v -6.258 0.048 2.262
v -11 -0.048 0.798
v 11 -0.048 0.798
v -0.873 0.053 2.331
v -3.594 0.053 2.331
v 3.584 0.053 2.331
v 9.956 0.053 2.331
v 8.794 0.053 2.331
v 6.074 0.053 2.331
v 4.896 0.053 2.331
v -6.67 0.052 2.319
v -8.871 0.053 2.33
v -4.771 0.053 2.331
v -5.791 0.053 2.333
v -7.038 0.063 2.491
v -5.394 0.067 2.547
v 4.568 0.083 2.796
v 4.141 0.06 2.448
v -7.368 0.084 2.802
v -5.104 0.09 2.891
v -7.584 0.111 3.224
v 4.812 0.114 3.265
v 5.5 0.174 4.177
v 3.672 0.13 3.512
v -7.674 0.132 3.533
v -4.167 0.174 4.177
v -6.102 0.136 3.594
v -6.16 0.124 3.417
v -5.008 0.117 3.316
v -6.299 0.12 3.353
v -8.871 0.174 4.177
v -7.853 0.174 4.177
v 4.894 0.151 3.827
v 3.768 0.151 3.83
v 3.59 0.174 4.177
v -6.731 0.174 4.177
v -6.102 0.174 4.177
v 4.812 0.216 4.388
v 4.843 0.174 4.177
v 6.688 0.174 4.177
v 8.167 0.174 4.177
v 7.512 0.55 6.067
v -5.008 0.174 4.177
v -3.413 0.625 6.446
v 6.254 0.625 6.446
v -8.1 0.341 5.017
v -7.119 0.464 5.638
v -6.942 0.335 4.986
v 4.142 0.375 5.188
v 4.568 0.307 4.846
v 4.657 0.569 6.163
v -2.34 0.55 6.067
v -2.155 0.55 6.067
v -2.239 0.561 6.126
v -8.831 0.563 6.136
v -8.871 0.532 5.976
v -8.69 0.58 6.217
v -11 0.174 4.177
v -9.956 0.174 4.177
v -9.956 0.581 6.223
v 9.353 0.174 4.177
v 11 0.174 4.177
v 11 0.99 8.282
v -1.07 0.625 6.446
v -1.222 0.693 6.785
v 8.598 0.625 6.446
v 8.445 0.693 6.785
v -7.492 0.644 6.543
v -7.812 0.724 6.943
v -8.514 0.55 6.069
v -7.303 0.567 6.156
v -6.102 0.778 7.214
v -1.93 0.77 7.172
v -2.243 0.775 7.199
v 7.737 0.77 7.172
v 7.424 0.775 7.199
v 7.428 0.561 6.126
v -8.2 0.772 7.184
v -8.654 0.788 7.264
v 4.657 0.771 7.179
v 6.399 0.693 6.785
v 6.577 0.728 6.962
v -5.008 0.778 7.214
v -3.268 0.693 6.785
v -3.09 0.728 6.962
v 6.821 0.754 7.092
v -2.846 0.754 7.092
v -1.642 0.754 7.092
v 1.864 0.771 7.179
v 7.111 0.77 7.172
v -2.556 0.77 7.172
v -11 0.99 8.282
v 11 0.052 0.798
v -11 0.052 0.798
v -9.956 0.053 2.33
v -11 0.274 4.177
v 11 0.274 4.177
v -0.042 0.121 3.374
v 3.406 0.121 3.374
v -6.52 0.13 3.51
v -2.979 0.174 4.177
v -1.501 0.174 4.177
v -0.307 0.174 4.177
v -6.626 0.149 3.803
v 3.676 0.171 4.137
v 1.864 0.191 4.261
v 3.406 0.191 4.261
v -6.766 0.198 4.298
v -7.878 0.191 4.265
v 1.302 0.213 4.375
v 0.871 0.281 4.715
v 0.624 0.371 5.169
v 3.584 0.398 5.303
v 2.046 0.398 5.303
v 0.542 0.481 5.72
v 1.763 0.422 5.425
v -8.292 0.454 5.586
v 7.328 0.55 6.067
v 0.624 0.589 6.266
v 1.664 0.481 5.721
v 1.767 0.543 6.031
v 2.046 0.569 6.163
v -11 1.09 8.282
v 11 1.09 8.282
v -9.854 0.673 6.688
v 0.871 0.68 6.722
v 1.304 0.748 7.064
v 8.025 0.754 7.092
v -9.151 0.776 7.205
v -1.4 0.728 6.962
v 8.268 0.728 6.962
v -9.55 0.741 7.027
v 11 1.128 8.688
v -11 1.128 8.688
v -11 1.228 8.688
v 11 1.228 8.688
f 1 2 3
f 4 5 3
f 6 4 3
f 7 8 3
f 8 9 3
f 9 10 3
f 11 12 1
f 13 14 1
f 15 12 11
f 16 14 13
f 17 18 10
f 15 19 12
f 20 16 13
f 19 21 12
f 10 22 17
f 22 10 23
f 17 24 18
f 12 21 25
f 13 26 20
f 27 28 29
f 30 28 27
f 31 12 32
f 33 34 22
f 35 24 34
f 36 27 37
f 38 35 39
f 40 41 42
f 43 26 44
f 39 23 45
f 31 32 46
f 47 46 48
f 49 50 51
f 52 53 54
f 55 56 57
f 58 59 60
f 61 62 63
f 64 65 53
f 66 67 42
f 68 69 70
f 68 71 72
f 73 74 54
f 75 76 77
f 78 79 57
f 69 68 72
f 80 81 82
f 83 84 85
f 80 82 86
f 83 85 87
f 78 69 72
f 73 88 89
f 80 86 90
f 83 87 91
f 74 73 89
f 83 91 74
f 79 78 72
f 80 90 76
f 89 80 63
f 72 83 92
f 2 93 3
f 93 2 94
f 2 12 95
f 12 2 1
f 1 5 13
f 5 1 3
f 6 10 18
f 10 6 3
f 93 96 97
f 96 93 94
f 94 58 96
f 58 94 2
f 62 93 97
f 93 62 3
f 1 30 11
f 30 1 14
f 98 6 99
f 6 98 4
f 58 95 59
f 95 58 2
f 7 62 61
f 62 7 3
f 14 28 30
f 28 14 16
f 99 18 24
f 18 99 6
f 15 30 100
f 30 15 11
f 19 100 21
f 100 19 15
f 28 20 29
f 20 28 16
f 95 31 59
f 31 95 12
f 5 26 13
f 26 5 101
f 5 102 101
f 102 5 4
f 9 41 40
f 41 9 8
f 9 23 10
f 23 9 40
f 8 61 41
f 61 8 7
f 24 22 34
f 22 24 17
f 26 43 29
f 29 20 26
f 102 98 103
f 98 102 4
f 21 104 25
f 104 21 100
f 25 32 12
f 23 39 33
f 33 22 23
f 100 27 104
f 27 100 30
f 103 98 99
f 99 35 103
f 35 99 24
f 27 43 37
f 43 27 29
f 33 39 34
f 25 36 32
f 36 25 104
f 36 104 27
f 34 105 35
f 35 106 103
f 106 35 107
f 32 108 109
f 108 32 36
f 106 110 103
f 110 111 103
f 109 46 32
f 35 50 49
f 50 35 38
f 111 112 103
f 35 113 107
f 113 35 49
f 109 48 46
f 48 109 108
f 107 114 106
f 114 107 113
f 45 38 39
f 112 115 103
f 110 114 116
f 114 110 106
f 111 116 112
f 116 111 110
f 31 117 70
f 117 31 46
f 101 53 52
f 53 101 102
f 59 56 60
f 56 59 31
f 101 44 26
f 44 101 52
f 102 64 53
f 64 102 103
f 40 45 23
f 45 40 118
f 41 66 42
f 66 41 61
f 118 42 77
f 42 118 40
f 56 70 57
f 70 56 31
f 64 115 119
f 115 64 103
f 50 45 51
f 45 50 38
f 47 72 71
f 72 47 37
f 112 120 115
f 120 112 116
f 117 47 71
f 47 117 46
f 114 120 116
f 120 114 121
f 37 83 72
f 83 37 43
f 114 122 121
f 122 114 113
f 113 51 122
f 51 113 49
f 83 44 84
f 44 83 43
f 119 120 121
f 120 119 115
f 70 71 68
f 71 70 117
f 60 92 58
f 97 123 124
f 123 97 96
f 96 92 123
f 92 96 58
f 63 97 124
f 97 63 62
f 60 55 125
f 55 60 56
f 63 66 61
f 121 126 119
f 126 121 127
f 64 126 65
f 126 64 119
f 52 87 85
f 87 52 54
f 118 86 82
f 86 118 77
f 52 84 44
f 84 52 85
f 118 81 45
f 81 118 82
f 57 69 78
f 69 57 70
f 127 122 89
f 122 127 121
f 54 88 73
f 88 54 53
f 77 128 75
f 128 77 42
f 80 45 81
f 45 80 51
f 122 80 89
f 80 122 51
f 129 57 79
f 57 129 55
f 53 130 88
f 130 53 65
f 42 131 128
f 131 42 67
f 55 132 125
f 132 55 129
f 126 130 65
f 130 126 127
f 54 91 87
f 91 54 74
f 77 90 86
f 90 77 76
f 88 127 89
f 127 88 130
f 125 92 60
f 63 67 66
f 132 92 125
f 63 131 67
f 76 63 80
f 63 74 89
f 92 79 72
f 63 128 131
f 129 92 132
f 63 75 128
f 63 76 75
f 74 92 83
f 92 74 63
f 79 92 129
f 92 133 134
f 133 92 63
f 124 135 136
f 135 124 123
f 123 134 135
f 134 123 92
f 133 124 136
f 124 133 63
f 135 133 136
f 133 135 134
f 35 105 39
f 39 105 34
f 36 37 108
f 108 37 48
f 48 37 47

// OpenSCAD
use <../lib.scad>
function ldraw_lib__6342851ec01() = [
// 0 Sticker  1 x  2.8 with Dark Bluish Grey NASA Worm Logo (Formed)
// 0 Name: 6342851ec01.dat
// 0 Author: Orion Pobursky [OrionP]
// 0 !LDRAW_ORG Part UPDATE 2023-01
// 0 !LICENSE Licensed under CC BY 4.0 : see CAreadme.txt
// 
// 0 BFC CERTIFY CCW
  [0,"BFC","CERTIFY"],
  [0,"BFC","CCW"],
// 
// 0 !KEYWORDS Discovery, Set 10283, Space Shuttle
// 
// 0 !HISTORY 2023-03-05 [OrionP] Official Update 2023-01
// 
// 
// 3 15 -15.645 -5.654867 0.12064 -27.5 -1.995718 -0.119194 27.5 -1.995718 -0.119194
  [3,15,-15.645,-5.654867,0.12064,-27.5,-1.995718,-0.119194,27.5,-1.995718,-0.119194],
// 3 15 -2.182 -5.827496 0.131954 -8.984 -5.827496 0.131954 27.5 -1.995718 -0.119194
  [3,15,-2.182,-5.827496,0.131954,-8.984,-5.827496,0.131954,27.5,-1.995718,-0.119194],
// 3 15 8.959 -5.828494 0.13202 -2.182 -5.827496 0.131954 27.5 -1.995718 -0.119194
  [3,15,8.959,-5.828494,0.13202,-2.182,-5.827496,0.131954,27.5,-1.995718,-0.119194],
// 3 15 24.89 -5.828494 0.13202 21.986 -5.828494 0.13202 27.5 -1.995718 -0.119194
  [3,15,24.89,-5.828494,0.13202,21.986,-5.828494,0.13202,27.5,-1.995718,-0.119194],
// 3 15 21.986 -5.828494 0.13202 15.185 -5.828494 0.13202 27.5 -1.995718 -0.119194
  [3,15,21.986,-5.828494,0.13202,15.185,-5.828494,0.13202,27.5,-1.995718,-0.119194],
// 3 15 15.185 -5.828494 0.13202 12.241 -5.828494 0.13202 27.5 -1.995718 -0.119194
  [3,15,15.185,-5.828494,0.13202,12.241,-5.828494,0.13202,27.5,-1.995718,-0.119194],
// 3 15 -16.675 -5.79756 0.129992 -22.177 -5.824503 0.131758 -15.645 -5.654867 0.12064
  [3,15,-16.675,-5.79756,0.129992,-22.177,-5.824503,0.131758,-15.645,-5.654867,0.12064],
// 3 15 -11.927 -5.827496 0.131954 -14.477 -5.832485 0.132281 -15.645 -5.654867 0.12064
  [3,15,-11.927,-5.827496,0.131954,-14.477,-5.832485,0.132281,-15.645,-5.654867,0.12064],
// 3 15 -17.595 -6.22664 0.158116 -22.177 -5.824503 0.131758 -16.675 -5.79756 0.129992
  [3,15,-17.595,-6.22664,0.158116,-22.177,-5.824503,0.131758,-16.675,-5.79756,0.129992],
// 3 15 -13.485 -6.36634 0.167272 -14.477 -5.832485 0.132281 -11.927 -5.827496 0.131954
  [3,15,-13.485,-6.36634,0.167272,-14.477,-5.832485,0.132281,-11.927,-5.827496,0.131954],
// 3 15 11.42 -6.991 0.208214 10.353 -6.118871 0.151052 12.241 -5.828494 0.13202
  [3,15,11.42,-6.991,0.208214,10.353,-6.118871,0.151052,12.241,-5.828494,0.13202],
// 3 15 -17.595 -6.22664 0.158116 -18.419 -7.005968 0.209195 -22.177 -5.824503 0.131758
  [3,15,-17.595,-6.22664,0.158116,-18.419,-7.005968,0.209195,-22.177,-5.824503,0.131758],
// 3 15 -12.761 -7.22849 0.22378 -13.485 -6.36634 0.167272 -11.927 -5.827496 0.131954
  [3,15,-12.761,-7.22849,0.22378,-13.485,-6.36634,0.167272,-11.927,-5.827496,0.131954],
// 3 15 -18.419 -7.005968 0.209195 -18.961 -8.060704 0.278326 -22.177 -5.824503 0.131758
  [3,15,-18.419,-7.005968,0.209195,-18.961,-8.060704,0.278326,-22.177,-5.824503,0.131758],
// 4 15 12.031 -8.161488 0.284932 11.42 -6.991 0.208214 12.241 -5.828494 0.13202 13.749291 -10.442095 0.434411
  [4,15,12.031,-8.161488,0.284932,11.42,-6.991,0.208214,12.241,-5.828494,0.13202,13.749291,-10.442095,0.434411],
// 3 72 11.42 -6.991 0.208214 9.179 -8.779163 0.325417 10.353 -6.118871 0.151052
  [3,72,11.42,-6.991,0.208214,9.179,-8.779163,0.325417,10.353,-6.118871,0.151052],
// 3 15 -22.177 -5.824503 0.131758 -18.961 -8.060704 0.278326 -19.185 -8.833047 0.328948
  [3,15,-22.177,-5.824503,0.131758,-18.961,-8.060704,0.278326,-19.185,-8.833047,0.328948],
// 3 15 -11.927 -5.827496 0.131954 -10.418528 -10.442095 0.434411 -12.761 -7.22849 0.22378
  [3,15,-11.927,-5.827496,0.131954,-10.418528,-10.442095,0.434411,-12.761,-7.22849,0.22378],
// 3 72 -15.254 -8.984722 0.33889 -15.4 -8.543668 0.309982 -12.52 -8.29121 0.293435
  [3,72,-15.254,-8.984722,0.33889,-15.4,-8.543668,0.309982,-12.52,-8.29121,0.293435],
// 3 15 -15.747 -8.383013 0.299452 -15.4 -8.543668 0.309982 -15.254 -8.984722 0.33889
  [3,15,-15.747,-8.383013,0.299452,-15.4,-8.543668,0.309982,-15.254,-8.984722,0.33889],
// 3 15 -22.177 -10.442095 .434411 -22.177 -5.824503 .131758 -19.632429 -10.442095 .434411
  [3,15,-22.177,-10.442095,.434411,-22.177,-5.824503,.131758,-19.632429,-10.442095,.434411],
// 3 72 12.234 -9.567471 0.377085 9.42 -9.575454 0.377608 12.031 -8.161488 0.284932
  [3,72,12.234,-9.567471,0.377085,9.42,-9.575454,0.377608,12.031,-8.161488,0.284932],
// 3 15 8.974959 -10.442095 .434411 9.179 -8.779163 .325417 9.42 -9.575454 .377608
  [3,15,8.974959,-10.442095,.434411,9.179,-8.779163,.325417,9.42,-9.575454,.377608],
// 3 15 -16.828495 -10.442095 .434411 -15.254 -8.984722 .33889 -15.254 -10.442095 .434411
  [3,15,-16.828495,-10.442095,.434411,-15.254,-8.984722,.33889,-15.254,-10.442095,.434411],
// 3 72 12.031 -10.969267 .539272 8.974959 -10.442095 .434411 12.108166 -10.442095 .434411
  [3,72,12.031,-10.969267,.539272,8.974959,-10.442095,.434411,12.108166,-10.442095,.434411],
// 3 15 16.7198 -10.442095 .434411 20.416429 -10.442095 .434411 18.781 -15.167028 1.374259
  [3,15,16.7198,-10.442095,.434411,20.416429,-10.442095,.434411,18.781,-15.167028,1.374259],
// 3 15 -12.52 -10.442095 .434411 -10.418528 -10.442095 .434411 -8.532 -16.114466 1.562716
  [3,15,-12.52,-10.442095,.434411,-10.418528,-10.442095,.434411,-8.532,-16.114466,1.562716],
// 3 15 12.108166 -10.442095 .434411 13.749291 -10.442095 .434411 15.636 -16.114466 1.562716
  [3,15,12.108166,-10.442095,.434411,13.749291,-10.442095,.434411,15.636,-16.114466,1.562716],
// 3 15 -22.177 -10.442095 .434411 -19.632429 -10.442095 .434411 -20.25 -12.543427 .852392
  [3,15,-22.177,-10.442095,.434411,-19.632429,-10.442095,.434411,-20.25,-12.543427,.852392],
// 3 72 -17.798 -14.094049 1.16083 -20.25 -12.543427 0.852392 -17.354 -12.465945 0.83698
  [3,72,-17.798,-14.094049,1.16083,-20.25,-12.543427,0.852392,-17.354,-12.465945,0.83698],
// 3 15 10.354 -12.97105 0.937451 11.421 -12.113843 0.766942 11.642 -15.40732 1.422056
  [3,15,10.354,-12.97105,0.937451,11.421,-12.113843,0.766942,11.642,-15.40732,1.422056],
// 3 15 -5.849 -15.167028 1.374259 -5.387 -15.167028 1.374259 -5.598 -15.315126 1.403717
  [3,15,-5.849,-15.167028,1.374259,-5.387,-15.167028,1.374259,-5.598,-15.315126,1.403717],
// 3 15 -22.077 -15.339646 1.408594 -22.177 -14.940466 1.329193 -21.725 -15.541688 1.448783
  [3,15,-22.077,-15.339646,1.408594,-22.177,-14.940466,1.329193,-21.725,-15.541688,1.448783],
// 3 15 -27.5 -10.442095 0.434411 -24.89 -10.442095 0.434411 -24.89 -15.558361 1.4521
  [3,15,-27.5,-10.442095,0.434411,-24.89,-10.442095,0.434411,-24.89,-15.558361,1.4521],
// 3 15 23.381265 -10.442095 .434411 27.5 -10.442095 .434411 27.5 -20.705524 2.475934
  [3,15,23.381265,-10.442095,.434411,27.5,-10.442095,.434411,27.5,-20.705524,2.475934],
// 3 72 -2.674 -16.114466 1.562716 -3.056 -16.961865 1.731274 -5.387 -15.167028 1.374259
  [3,72,-2.674,-16.114466,1.562716,-3.056,-16.961865,1.731274,-5.387,-15.167028,1.374259],
// 3 72 21.494 -16.114466 1.562716 21.112 -16.961865 1.731274 18.781 -15.167028 1.374259
  [3,72,21.494,-16.114466,1.562716,21.112,-16.961865,1.731274,18.781,-15.167028,1.374259],
// 3 72 -18.731 -16.357701 1.611098 -19.531 -17.358102 1.81009 -21.285 -15.171932 1.375234
  [3,72,-18.731,-16.357701,1.611098,-19.531,-17.358102,1.81009,-21.285,-15.171932,1.375234],
// 3 15 -18.731 -16.357701 1.611098 -18.257 -15.390647 1.418739 -15.254 -18.033863 1.944508
  [3,15,-18.731,-16.357701,1.611098,-18.257,-15.390647,1.418739,-15.254,-18.033863,1.944508],
// 3 72 -4.826 -17.9299 1.923828 -5.608 -17.996593 1.937094 -5.598 -15.315126 1.403717
  [3,72,-4.826,-17.9299,1.923828,-5.608,-17.996593,1.937094,-5.598,-15.315126,1.403717],
// 3 72 19.343 -17.9299 1.923828 18.56 -17.996593 1.937094 18.57 -15.315126 1.403717
  [3,72,19.343,-17.9299,1.923828,18.56,-17.996593,1.937094,18.57,-15.315126,1.403717],
// 3 72 -20.499 -17.959323 1.929681 -21.634 -18.159404 1.969479 -21.725 -15.541688 1.448783
  [3,72,-20.499,-17.959323,1.929681,-21.634,-18.159404,1.969479,-21.725,-15.541688,1.448783],
// 3 15 -19.531 -17.358102 1.81009 -18.731 -16.357701 1.611098 -15.254 -18.033863 1.944508
  [3,15,-19.531,-17.358102,1.81009,-18.731,-16.357701,1.611098,-15.254,-18.033863,1.944508],
// 3 15 11.642 -17.946573 1.927145 15.998 -16.961865 1.731274 16.443 -17.40518 1.819455
  [3,15,11.642,-17.946573,1.927145,15.998,-16.961865,1.731274,16.443,-17.40518,1.819455],
// 3 15 -12.52 -18.033863 1.944508 -8.17 -16.961865 1.731274 -7.725 -17.40518 1.819455
  [3,15,-12.52,-18.033863,1.944508,-8.17,-16.961865,1.731274,-7.725,-17.40518,1.819455],
// 3 15 11.642 -17.946573 1.927145 16.443 -17.40518 1.819455 17.053 -17.730801 1.884225
  [3,15,11.642,-17.946573,1.927145,16.443,-17.40518,1.819455,17.053,-17.730801,1.884225],
// 3 15 -12.52 -18.033863 1.944508 -7.725 -17.40518 1.819455 -7.115 -17.730801 1.884225
  [3,15,-12.52,-18.033863,1.944508,-7.725,-17.40518,1.819455,-7.115,-17.730801,1.884225],
// 3 15 -20.499 -17.959323 1.929681 -19.531 -17.358102 1.81009 -15.254 -18.033863 1.944508
  [3,15,-20.499,-17.959323,1.929681,-19.531,-17.358102,1.81009,-15.254,-18.033863,1.944508],
// 3 15 -4.826 -17.9299 1.923828 -4.106 -17.730801 1.884225 4.66 -17.946573 1.927145
  [3,15,-4.826,-17.9299,1.923828,-4.106,-17.730801,1.884225,4.66,-17.946573,1.927145],
// 3 15 11.642 -17.946573 1.927145 17.053 -17.730801 1.884225 17.777 -17.9299 1.923828
  [3,15,11.642,-17.946573,1.927145,17.053,-17.730801,1.884225,17.777,-17.9299,1.923828],
// 3 15 -12.52 -18.033863 1.944508 -7.115 -17.730801 1.884225 -6.391 -17.9299 1.923828
  [3,15,-12.52,-18.033863,1.944508,-7.115,-17.730801,1.884225,-6.391,-17.9299,1.923828],
// 3 15 -5.608 -17.996593 1.937094 -4.826 -17.9299 1.923828 4.66 -17.946573 1.927145
  [3,15,-5.608,-17.996593,1.937094,-4.826,-17.9299,1.923828,4.66,-17.946573,1.927145],
// 3 15 -12.52 -18.033863 1.944508 -6.391 -17.9299 1.923828 -5.608 -17.996593 1.937094
  [3,15,-12.52,-18.033863,1.944508,-6.391,-17.9299,1.923828,-5.608,-17.996593,1.937094],
// 3 15 -21.634 -18.159404 1.969479 -20.499 -17.959323 1.929681 -15.254 -18.033863 1.944508
  [3,15,-21.634,-18.159404,1.969479,-20.499,-17.959323,1.929681,-15.254,-18.033863,1.944508],
// 3 15 11.642 -17.946573 1.927145 17.777 -17.9299 1.923828 18.56 -17.996593 1.937094
  [3,15,11.642,-17.946573,1.927145,17.777,-17.9299,1.923828,18.56,-17.996593,1.937094],
// 3 15 4.66 -17.946573 1.927145 11.642 -17.946573 1.927145 27.5 -20.705524 2.475934
  [3,15,4.66,-17.946573,1.927145,11.642,-17.946573,1.927145,27.5,-20.705524,2.475934],
// 3 15 -15.254 -18.033863 1.944508 -12.52 -18.033863 1.944508 -27.5 -20.705524 2.475934
  [3,15,-15.254,-18.033863,1.944508,-12.52,-18.033863,1.944508,-27.5,-20.705524,2.475934],
// 4 16 27.5 -1.995718 -0.119194 -27.5 -1.995718 -0.119194 -27.5 -1.995718 0.130806 27.5 -1.995718 0.130806
  [4,16,27.5,-1.995718,-0.119194,-27.5,-1.995718,-0.119194,-27.5,-1.995718,0.130806,27.5,-1.995718,0.130806],
// 4 15 -15.645 -5.654867 0.12064 -22.177 -5.824503 0.131758 -24.89 -5.824503 0.131758 -27.5 -1.995718 -0.119194
  [4,15,-15.645,-5.654867,0.12064,-22.177,-5.824503,0.131758,-24.89,-5.824503,0.131758,-27.5,-1.995718,-0.119194],
// 4 15 -8.984 -5.827496 0.131954 -11.927 -5.827496 0.131954 -15.645 -5.654867 0.12064 27.5 -1.995718 -0.119194
  [4,15,-8.984,-5.827496,0.131954,-11.927,-5.827496,0.131954,-15.645,-5.654867,0.12064,27.5,-1.995718,-0.119194],
// 4 15 12.241 -5.828494 0.13202 10.353 -6.118871 0.151052 8.959 -5.828494 0.13202 27.5 -1.995718 -0.119194
  [4,15,12.241,-5.828494,0.13202,10.353,-6.118871,0.151052,8.959,-5.828494,0.13202,27.5,-1.995718,-0.119194],
// 4 16 27.5 -1.995718 0.130806 -27.5 -1.995718 0.130806 -27.5 -10.442095 0.684411 27.5 -10.442095 0.684411
  [4,16,27.5,-1.995718,0.130806,-27.5,-1.995718,0.130806,-27.5,-10.442095,0.684411,27.5,-10.442095,0.684411],
// 4 16 -27.5 -1.995718 0.130806 -27.5 -1.995718 -0.119194 -27.5 -10.442095 0.434411 -27.5 -10.442095 0.684411
  [4,16,-27.5,-1.995718,0.130806,-27.5,-1.995718,-0.119194,-27.5,-10.442095,0.434411,-27.5,-10.442095,0.684411],
// 4 16 27.5 -1.995718 -0.119194 27.5 -1.995718 0.130806 27.5 -10.442095 0.684411 27.5 -10.442095 0.434411
  [4,16,27.5,-1.995718,-0.119194,27.5,-1.995718,0.130806,27.5,-10.442095,0.684411,27.5,-10.442095,0.434411],
// 4 72 -14.477 -5.832485 0.132281 -15.747 -8.383013 0.299452 -16.675 -5.79756 0.129992 -15.645 -5.654867 0.12064
  [4,72,-14.477,-5.832485,0.132281,-15.747,-8.383013,0.299452,-16.675,-5.79756,0.129992,-15.645,-5.654867,0.12064],
// 4 72 8.959 -5.828494 0.13202 8.516 -8.433904 0.302787 -0.104 -8.433904 0.302787 -2.182 -5.827496 0.131954
  [4,72,8.959,-5.828494,0.13202,8.516,-8.433904,0.302787,-0.104,-8.433904,0.302787,-2.182,-5.827496,0.131954],
// 4 15 -24.89 -5.824503 0.131758 -24.89 -10.442095 0.434411 -27.5 -10.442095 0.434411 -27.5 -1.995718 -0.119194
  [4,15,-24.89,-5.824503,0.131758,-24.89,-10.442095,0.434411,-27.5,-10.442095,0.434411,-27.5,-1.995718,-0.119194],
// 4 15 27.5 -10.442095 0.434411 23.381265 -10.442095 0.434411 24.89 -5.828494 0.13202 27.5 -1.995718 -0.119194
  [4,15,27.5,-10.442095,0.434411,23.381265,-10.442095,0.434411,24.89,-5.828494,0.13202,27.5,-1.995718,-0.119194],
// 4 72 -13.485 -6.36634 0.167272 -15.4 -8.543668 0.309982 -15.747 -8.383013 0.299452 -14.477 -5.832485 0.132281
  [4,72,-13.485,-6.36634,0.167272,-15.4,-8.543668,0.309982,-15.747,-8.383013,0.299452,-14.477,-5.832485,0.132281],
// 4 72 10.353 -6.118871 0.151052 9.179 -8.779163 0.325417 8.516 -8.433904 0.302787 8.959 -5.828494 0.13202
  [4,72,10.353,-6.118871,0.151052,9.179,-8.779163,0.325417,8.516,-8.433904,0.302787,8.959,-5.828494,0.13202],
// 4 72 -15.747 -8.383013 0.299452 -16.299 -8.774174 0.32509 -17.595 -6.22664 0.158116 -16.675 -5.79756 0.129992
  [4,72,-15.747,-8.383013,0.299452,-16.299,-8.774174,0.32509,-17.595,-6.22664,0.158116,-16.675,-5.79756,0.129992],
// 4 72 -16.299 -8.774174 0.32509 -18.961 -8.060704 0.278326 -18.419 -7.005968 0.209195 -17.595 -6.22664 0.158116
  [4,72,-16.299,-8.774174,0.32509,-18.961,-8.060704,0.278326,-18.419,-7.005968,0.209195,-17.595,-6.22664,0.158116],
// 4 72 -12.761 -7.22849 0.22378 -12.52 -8.29121 0.293435 -15.4 -8.543668 0.309982 -13.485 -6.36634 0.167272
  [4,72,-12.761,-7.22849,0.22378,-12.52,-8.29121,0.293435,-15.4,-8.543668,0.309982,-13.485,-6.36634,0.167272],
// 4 72 -22.177 -10.442095 .434411 -24.89 -10.442095 .434411 -24.89 -5.824503 .131758 -22.177 -5.824503 .131758
  [4,72,-22.177,-10.442095,.434411,-24.89,-10.442095,.434411,-24.89,-5.824503,.131758,-22.177,-5.824503,.131758],
// 4 72 -7.44854 -10.442095 0.434411 -10.418528 -10.442095 0.434411 -11.927 -5.827496 0.131954 -8.984 -5.827496 0.131954
  [4,72,-7.44854,-10.442095,0.434411,-10.418528,-10.442095,0.434411,-11.927,-5.827496,0.131954,-8.984,-5.827496,0.131954],
// 4 15 -3.751744 -10.442095 0.434411 -7.44854 -10.442095 0.434411 -8.984 -5.827496 0.131954 -2.182 -5.827496 0.131954
  [4,15,-3.751744,-10.442095,0.434411,-7.44854,-10.442095,0.434411,-8.984,-5.827496,0.131954,-2.182,-5.827496,0.131954],
// 4 15 20.416429 -10.442095 .434411 16.7198 -10.442095 .434411 15.185 -5.828494 .13202 21.986 -5.828494 .13202
  [4,15,20.416429,-10.442095,.434411,16.7198,-10.442095,.434411,15.185,-5.828494,.13202,21.986,-5.828494,.13202],
// 4 72 16.7198 -10.442095 .434411 13.749291 -10.442095 .434411 12.241 -5.828494 .13202 15.185 -5.828494 .13202
  [4,72,16.7198,-10.442095,.434411,13.749291,-10.442095,.434411,12.241,-5.828494,.13202,15.185,-5.828494,.13202],
// 4 72 23.381265 -10.442095 0.434411 20.416429 -10.442095 0.434411 21.986 -5.828494 0.13202 24.89 -5.828494 0.13202
  [4,72,23.381265,-10.442095,0.434411,20.416429,-10.442095,0.434411,21.986,-5.828494,0.13202,24.89,-5.828494,0.13202],
// 4 72 12.031 -8.161488 0.284932 9.42 -9.575454 0.377608 9.179 -8.779163 0.325417 11.42 -6.991 0.208214
  [4,72,12.031,-8.161488,0.284932,9.42,-9.575454,0.377608,9.179,-8.779163,0.325417,11.42,-6.991,0.208214],
// 3 15 -10.418528 -10.442095 .434411 -12.52 -10.442095 .434411 -12.52 -8.29121 .293435
  [3,15,-10.418528,-10.442095,.434411,-12.52,-10.442095,.434411,-12.52,-8.29121,.293435],
// 3 15 -12.52 -8.29121 .293435 -12.761 -7.22849 .22378 -10.418528 -10.442095 .434411
  [3,15,-12.52,-8.29121,.293435,-12.761,-7.22849,.22378,-10.418528,-10.442095,.434411],
// 4 72 -.104 -8.433904 .302787 -.767433 -10.442095 .434411 -3.751744 -10.442095 .434411 -2.182 -5.827496 .131954
  [4,72,-.104,-8.433904,.302787,-.767433,-10.442095,.434411,-3.751744,-10.442095,.434411,-2.182,-5.827496,.131954],
// 4 72 -16.299 -8.774174 0.32509 -16.564 -9.508598 0.373226 -19.185 -8.833047 0.328948 -18.961 -8.060704 0.278326
  [4,72,-16.299,-8.774174,0.32509,-16.564,-9.508598,0.373226,-19.185,-8.833047,0.328948,-18.961,-8.060704,0.278326],
// 3 15 -19.185 -8.833047 .328948 -19.632429 -10.442095 .434411 -22.177 -5.824503 .131758
  [3,15,-19.185,-8.833047,.328948,-19.632429,-10.442095,.434411,-22.177,-5.824503,.131758],
// 3 15 13.749291 -10.442095 .434411 12.108166 -10.442095 .434411 12.234 -9.567471 .377085
  [3,15,13.749291,-10.442095,.434411,12.108166,-10.442095,.434411,12.234,-9.567471,.377085],
// 3 15 12.234 -9.567471 .377085 12.031 -8.161488 .284932 13.749291 -10.442095 .434411
  [3,15,12.234,-9.567471,.377085,12.031,-8.161488,.284932,13.749291,-10.442095,.434411],
// 4 15 -15.254 -8.984722 0.33889 -16.564 -9.508598 0.373226 -16.299 -8.774174 0.32509 -15.747 -8.383013 0.299452
  [4,15,-15.254,-8.984722,0.33889,-16.564,-9.508598,0.373226,-16.299,-8.774174,0.32509,-15.747,-8.383013,0.299452],
// 3 15 -.767433 -10.442095 .434411 -.104 -8.433904 .302787 8.516 -8.433904 .302787
  [3,15,-.767433,-10.442095,.434411,-.104,-8.433904,.302787,8.516,-8.433904,.302787],
// 4 15 9.179 -8.779163 .325417 8.974959 -10.442095 .434411 -.767433 -10.442095 .434411 8.516 -8.433904 .302787
  [4,15,9.179,-8.779163,.325417,8.974959,-10.442095,.434411,-.767433,-10.442095,.434411,8.516,-8.433904,.302787],
// 4 72 -12.52 -10.442095 .434411 -15.254 -10.442095 .434411 -15.254 -8.984722 .33889 -12.52 -8.29121 .293435
  [4,72,-12.52,-10.442095,.434411,-15.254,-10.442095,.434411,-15.254,-8.984722,.33889,-12.52,-8.29121,.293435],
// 3 72 12.234 -9.567471 .377085 12.108166 -10.442095 .434411 9.42 -9.575454 .377608
  [3,72,12.234,-9.567471,.377085,12.108166,-10.442095,.434411,9.42,-9.575454,.377608],
// 4 72 -16.564 -9.508598 .373226 -16.828495 -10.442095 .434411 -19.632429 -10.442095 .434411 -19.185 -8.833047 .328948
  [4,72,-16.564,-9.508598,.373226,-16.828495,-10.442095,.434411,-19.632429,-10.442095,.434411,-19.185,-8.833047,.328948],
// 3 15 -16.828495 -10.442095 .434411 -16.564 -9.508598 .373226 -15.254 -8.984722 .33889
  [3,15,-16.828495,-10.442095,.434411,-16.564,-9.508598,.373226,-15.254,-8.984722,.33889],
// 3 15 9.42 -9.575454 .377608 9.189 -10.34181 .427838 8.974959 -10.442095 .434411
  [3,15,9.42,-9.575454,.377608,9.189,-10.34181,.427838,8.974959,-10.442095,.434411],
// 4 15 8.516 -10.653454 .476453 4.659 -10.653454 .476453 -.767433 -10.442095 .434411 8.974959 -10.442095 .434411
  [4,15,8.516,-10.653454,.476453,4.659,-10.653454,.476453,-.767433,-10.442095,.434411,8.974959,-10.442095,.434411],
// 4 72 -16.916 -10.745648 .494791 -19.695 -10.663262 .478404 -19.632429 -10.442095 .434411 -16.828495 -10.442095 .434411
  [4,72,-16.916,-10.745648,.494791,-19.695,-10.663262,.478404,-19.632429,-10.442095,.434411,-16.828495,-10.442095,.434411],
// 3 15 4.659 -10.653454 .476453 3.255 -10.936901 .532834 -.767433 -10.442095 .434411
  [3,15,4.659,-10.653454,.476453,3.255,-10.936901,.532834,-.767433,-10.442095,.434411],
// 3 15 3.255 -10.936901 .532834 2.178 -11.786261 .701782 -.767433 -10.442095 .434411
  [3,15,3.255,-10.936901,.532834,2.178,-11.786261,.701782,-.767433,-10.442095,.434411],
// 3 15 -19.695 -10.663262 .478404 -20.25 -12.543427 .852392 -19.632429 -10.442095 .434411
  [3,15,-19.695,-10.663262,.478404,-20.25,-12.543427,.852392,-19.632429,-10.442095,.434411],
// 4 72 12.031 -10.969267 .539272 11.421 -12.113843 .766942 10.354 -12.97105 .937451 8.974959 -10.442095 .434411
  [4,72,12.031,-10.969267,.539272,11.421,-12.113843,.766942,10.354,-12.97105,.937451,8.974959,-10.442095,.434411],
// 3 15 2.178 -11.786261 .701782 1.56 -12.922991 .927892 -.767433 -10.442095 .434411
  [3,15,2.178,-11.786261,.701782,1.56,-12.922991,.927892,-.767433,-10.442095,.434411],
// 4 72 10.354 -12.97105 .937451 8.961 -13.257439 .994418 8.516 -10.653454 .476453 8.974959 -10.442095 .434411
  [4,72,10.354,-12.97105,.937451,8.961,-13.257439,.994418,8.516,-10.653454,.476453,8.974959,-10.442095,.434411],
// 4 72 -16.916 -10.745648 0.494791 -17.354 -12.465945 0.83698 -20.25 -12.543427 0.852392 -19.695 -10.663262 0.478404
  [4,72,-16.916,-10.745648,0.494791,-17.354,-12.465945,0.83698,-20.25,-12.543427,0.852392,-19.695,-10.663262,0.478404],
// 4 72 8.961 -13.257439 0.994418 5.115 -13.257439 0.994418 4.659 -10.653454 0.476453 8.516 -10.653454 0.476453
  [4,72,8.961,-13.257439,0.994418,5.115,-13.257439,0.994418,4.659,-10.653454,0.476453,8.516,-10.653454,0.476453],
// 3 15 15.636 -16.114466 1.562716 12.031 -10.969267 .539272 12.108166 -10.442095 .434411
  [3,15,15.636,-16.114466,1.562716,12.031,-10.969267,.539272,12.108166,-10.442095,.434411],
// 3 15 1.56 -12.922991 .927892 1.354 -14.300014 1.201799 -.767433 -10.442095 .434411
  [3,15,1.56,-12.922991,.927892,1.354,-14.300014,1.201799,-.767433,-10.442095,.434411],
// 4 72 5.115 -13.257439 0.994418 4.407 -13.562463 1.055091 3.255 -10.936901 0.532834 4.659 -10.653454 0.476453
  [4,72,5.115,-13.257439,0.994418,4.407,-13.562463,1.055091,3.255,-10.936901,0.532834,4.659,-10.653454,0.476453],
// 4 72 4.407 -13.562463 1.055091 1.56 -12.922991 0.927892 2.178 -11.786261 0.701782 3.255 -10.936901 0.532834
  [4,72,4.407,-13.562463,1.055091,1.56,-12.922991,0.927892,2.178,-11.786261,0.701782,3.255,-10.936901,0.532834],
// 4 15 -20.25 -12.543427 .852392 -20.73 -13.964585 1.135078 -21.285 -15.171932 1.375234 -22.177 -10.442095 .434411
  [4,15,-20.25,-12.543427,.852392,-20.73,-13.964585,1.135078,-21.285,-15.171932,1.375234,-22.177,-10.442095,.434411],
// 4 15 -5.387 -15.167028 1.374259 -5.849 -15.167028 1.374259 -7.44854 -10.442095 0.434411 -3.751744 -10.442095 0.434411
  [4,15,-5.387,-15.167028,1.374259,-5.849,-15.167028,1.374259,-7.44854,-10.442095,0.434411,-3.751744,-10.442095,0.434411],
// 4 72 -22.177 -14.940466 1.329193 -24.89 -15.558361 1.4521 -24.89 -10.442095 .434411 -22.177 -10.442095 .434411
  [4,72,-22.177,-14.940466,1.329193,-24.89,-15.558361,1.4521,-24.89,-10.442095,.434411,-22.177,-10.442095,.434411],
// 4 72 -5.849 -15.167028 1.374259 -8.532 -16.114466 1.562716 -10.418528 -10.442095 0.434411 -7.44854 -10.442095 0.434411
  [4,72,-5.849,-15.167028,1.374259,-8.532,-16.114466,1.562716,-10.418528,-10.442095,0.434411,-7.44854,-10.442095,0.434411],
// 4 72 -2.674 -16.114466 1.562716 -5.387 -15.167028 1.374259 -3.751744 -10.442095 .434411 -.767433 -10.442095 .434411
  [4,72,-2.674,-16.114466,1.562716,-5.387,-15.167028,1.374259,-3.751744,-10.442095,.434411,-.767433,-10.442095,.434411],
// 4 72 18.319 -15.167028 1.374259 15.636 -16.114466 1.562716 13.749291 -10.442095 .434411 16.7198 -10.442095 .434411
  [4,72,18.319,-15.167028,1.374259,15.636,-16.114466,1.562716,13.749291,-10.442095,.434411,16.7198,-10.442095,.434411],
// 4 72 21.494 -16.114466 1.562716 18.781 -15.167028 1.374259 20.416429 -10.442095 0.434411 23.381265 -10.442095 0.434411
  [4,72,21.494,-16.114466,1.562716,18.781,-15.167028,1.374259,20.416429,-10.442095,0.434411,23.381265,-10.442095,0.434411],
// 4 15 18.781 -15.167028 1.374259 18.57 -15.315126 1.403717 18.319 -15.167028 1.374259 16.7198 -10.442095 .434411
  [4,15,18.781,-15.167028,1.374259,18.57,-15.315126,1.403717,18.319,-15.167028,1.374259,16.7198,-10.442095,.434411],
// 4 15 -21.285 -15.171932 1.375234 -21.725 -15.541688 1.448783 -22.177 -14.940466 1.329193 -22.177 -10.442095 .434411
  [4,15,-21.285,-15.171932,1.375234,-21.725,-15.541688,1.448783,-22.177,-14.940466,1.329193,-22.177,-10.442095,.434411],
// 4 15 1.354 -14.300014 1.201799 1.56 -15.665267 1.473364 -2.674 -16.114466 1.562716 -.767433 -10.442095 .434411
  [4,15,1.354,-14.300014,1.201799,1.56,-15.665267,1.473364,-2.674,-16.114466,1.562716,-.767433,-10.442095,.434411],
// 4 15 15.636 -16.114466 1.562716 11.642 -15.40732 1.422056 11.421 -12.113843 0.766942 12.031 -10.969267 0.539272
  [4,15,15.636,-16.114466,1.562716,11.642,-15.40732,1.422056,11.421,-12.113843,0.766942,12.031,-10.969267,0.539272],
// 4 15 -15.254 -18.033863 1.944508 -18.257 -15.390647 1.418739 -17.798 -14.094049 1.16083 -15.254 -10.442095 .434411
  [4,15,-15.254,-18.033863,1.944508,-18.257,-15.390647,1.418739,-17.798,-14.094049,1.16083,-15.254,-10.442095,.434411],
// 4 72 4.407 -13.562463 1.055091 4.161 -14.301975 1.202189 1.354 -14.300014 1.201799 1.56 -12.922991 0.927892
  [4,72,4.407,-13.562463,1.055091,4.161,-14.301975,1.202189,1.354,-14.300014,1.201799,1.56,-12.922991,0.927892],
// 4 72 -17.798 -14.094049 1.16083 -18.257 -15.390647 1.418739 -20.73 -13.964585 1.135078 -20.25 -12.543427 0.852392
  [4,72,-17.798,-14.094049,1.16083,-18.257,-15.390647,1.418739,-20.73,-13.964585,1.135078,-20.25,-12.543427,0.852392],
// 4 15 4.417 -15.076796 1.35631 4.161 -14.301975 1.202189 4.407 -13.562463 1.055091 5.115 -13.257439 0.994418
  [4,15,4.417,-15.076796,1.35631,4.161,-14.301975,1.202189,4.407,-13.562463,1.055091,5.115,-13.257439,0.994418],
// 4 72 -12.52 -18.033863 1.944508 -15.254 -18.033863 1.944508 -15.254 -10.442095 .434411 -12.52 -10.442095 .434411
  [4,72,-12.52,-18.033863,1.944508,-15.254,-18.033863,1.944508,-15.254,-10.442095,.434411,-12.52,-10.442095,.434411],
// 4 15 5.115 -15.40732 1.422056 4.417 -15.076796 1.35631 5.115 -13.257439 0.994418 8.961 -13.257439 0.994418
  [4,15,5.115,-15.40732,1.422056,4.417,-15.076796,1.35631,5.115,-13.257439,0.994418,8.961,-13.257439,0.994418],
// 4 15 11.642 -15.40732 1.422056 5.115 -15.40732 1.422056 8.961 -13.257439 0.994418 10.354 -12.97105 0.937451
  [4,15,11.642,-15.40732,1.422056,5.115,-15.40732,1.422056,8.961,-13.257439,0.994418,10.354,-12.97105,0.937451],
// 4 15 -8.532 -16.114466 1.562716 -8.17 -16.961865 1.731274 -12.52 -18.033863 1.944508 -12.52 -10.442095 .434411
  [4,15,-8.532,-16.114466,1.562716,-8.17,-16.961865,1.731274,-12.52,-18.033863,1.944508,-12.52,-10.442095,.434411],
// 4 72 4.161 -14.301975 1.202189 4.417 -15.076796 1.35631 1.56 -15.665267 1.473364 1.354 -14.300014 1.201799
  [4,72,4.161,-14.301975,1.202189,4.417,-15.076796,1.35631,1.56,-15.665267,1.473364,1.354,-14.300014,1.201799],
// 4 72 -18.257 -15.390647 1.418739 -18.731 -16.357701 1.611098 -21.285 -15.171932 1.375234 -20.73 -13.964585 1.135078
  [4,72,-18.257,-15.390647,1.418739,-18.731,-16.357701,1.611098,-21.285,-15.171932,1.375234,-20.73,-13.964585,1.135078],
// 3 15 -24.89 -15.558361 1.4521 -27.5 -20.705524 2.475934 -27.5 -10.442095 .434411
  [3,15,-24.89,-15.558361,1.4521,-27.5,-20.705524,2.475934,-27.5,-10.442095,.434411],
// 4 16 27.5 -10.442095 0.684411 -27.5 -10.442095 0.684411 -27.5 -20.705524 2.725934 27.5 -20.705524 2.725934
  [4,16,27.5,-10.442095,0.684411,-27.5,-10.442095,0.684411,-27.5,-20.705524,2.725934,27.5,-20.705524,2.725934],
// 4 16 -27.5 -10.442095 .684411 -27.5 -10.442095 .434411 -27.5 -20.705524 2.475934 -27.5 -20.705524 2.725934
  [4,16,-27.5,-10.442095,.684411,-27.5,-10.442095,.434411,-27.5,-20.705524,2.475934,-27.5,-20.705524,2.725934],
// 4 16 27.5 -10.442095 .434411 27.5 -10.442095 .684411 27.5 -20.705524 2.725934 27.5 -20.705524 2.475934
  [4,16,27.5,-10.442095,.434411,27.5,-10.442095,.684411,27.5,-20.705524,2.725934,27.5,-20.705524,2.475934],
// 4 72 -22.077 -15.339646 1.408594 -24.636 -16.720592 1.683282 -24.89 -15.558361 1.4521 -22.177 -14.940466 1.329193
  [4,72,-22.077,-15.339646,1.408594,-24.636,-16.720592,1.683282,-24.89,-15.558361,1.4521,-22.177,-14.940466,1.329193],
// 3 15 27.5 -20.705524 2.475934 21.494 -16.114466 1.562716 23.381265 -10.442095 .434411
  [3,15,27.5,-20.705524,2.475934,21.494,-16.114466,1.562716,23.381265,-10.442095,.434411],
// 4 72 3.261 -17.661165 1.870373 2.178 -16.803958 1.699864 1.56 -15.665267 1.473364 4.417 -15.076796 1.35631
  [4,72,3.261,-17.661165,1.870373,2.178,-16.803958,1.699864,1.56,-15.665267,1.473364,4.417,-15.076796,1.35631],
// 4 15 2.178 -16.803958 1.699864 -3.056 -16.961865 1.731274 -2.674 -16.114466 1.562716 1.56 -15.665267 1.473364
  [4,15,2.178,-16.803958,1.699864,-3.056,-16.961865,1.731274,-2.674,-16.114466,1.562716,1.56,-15.665267,1.473364],
// 4 72 -5.598 -15.315126 1.403717 -7.115 -17.730801 1.884225 -7.725 -17.40518 1.819455 -5.849 -15.167028 1.374259
  [4,72,-5.598,-15.315126,1.403717,-7.115,-17.730801,1.884225,-7.725,-17.40518,1.819455,-5.849,-15.167028,1.374259],
// 4 72 18.57 -15.315126 1.403717 17.053 -17.730801 1.884225 16.443 -17.40518 1.819455 18.319 -15.167028 1.374259
  [4,72,18.57,-15.315126,1.403717,17.053,-17.730801,1.884225,16.443,-17.40518,1.819455,18.319,-15.167028,1.374259],
// 4 72 -7.725 -17.40518 1.819455 -8.17 -16.961865 1.731274 -8.532 -16.114466 1.562716 -5.849 -15.167028 1.374259
  [4,72,-7.725,-17.40518,1.819455,-8.17,-16.961865,1.731274,-8.532,-16.114466,1.562716,-5.849,-15.167028,1.374259],
// 4 72 16.443 -17.40518 1.819455 15.998 -16.961865 1.731274 15.636 -16.114466 1.562716 18.319 -15.167028 1.374259
  [4,72,16.443,-17.40518,1.819455,15.998,-16.961865,1.731274,15.636,-16.114466,1.562716,18.319,-15.167028,1.374259],
// 4 72 -19.531 -17.358102 1.81009 -20.499 -17.959323 1.929681 -21.725 -15.541688 1.448783 -21.285 -15.171932 1.375234
  [4,72,-19.531,-17.358102,1.81009,-20.499,-17.959323,1.929681,-21.725,-15.541688,1.448783,-21.285,-15.171932,1.375234],
// 4 72 5.115 -15.40732 1.422056 4.66 -17.946573 1.927145 3.261 -17.661165 1.870373 4.417 -15.076796 1.35631
  [4,72,5.115,-15.40732,1.422056,4.66,-17.946573,1.927145,3.261,-17.661165,1.870373,4.417,-15.076796,1.35631],
// 4 72 -4.106 -17.730801 1.884225 -4.826 -17.9299 1.923828 -5.598 -15.315126 1.403717 -5.387 -15.167028 1.374259
  [4,72,-4.106,-17.730801,1.884225,-4.826,-17.9299,1.923828,-5.598,-15.315126,1.403717,-5.387,-15.167028,1.374259],
// 4 72 20.062 -17.730801 1.884225 19.343 -17.9299 1.923828 18.57 -15.315126 1.403717 18.781 -15.167028 1.374259
  [4,72,20.062,-17.730801,1.884225,19.343,-17.9299,1.923828,18.57,-15.315126,1.403717,18.781,-15.167028,1.374259],
// 4 15 15.636 -16.114466 1.562716 15.998 -16.961865 1.731274 11.642 -17.946573 1.927145 11.642 -15.40732 1.422056
  [4,15,15.636,-16.114466,1.562716,15.998,-16.961865,1.731274,11.642,-17.946573,1.927145,11.642,-15.40732,1.422056],
// 4 72 11.642 -17.946573 1.927145 4.66 -17.946573 1.927145 5.115 -15.40732 1.422056 11.642 -15.40732 1.422056
  [4,72,11.642,-17.946573,1.927145,4.66,-17.946573,1.927145,5.115,-15.40732,1.422056,11.642,-15.40732,1.422056],
// 4 72 -21.725 -15.541688 1.448783 -21.634 -18.159404 1.969479 -22.878 -18.012286 1.940216 -22.077 -15.339646 1.408594
  [4,72,-21.725,-15.541688,1.448783,-21.634,-18.159404,1.969479,-22.878,-18.012286,1.940216,-22.077,-15.339646,1.408594],
// 4 72 -3.056 -16.961865 1.731274 -3.499 -17.40518 1.819455 -4.106 -17.730801 1.884225 -5.387 -15.167028 1.374259
  [4,72,-3.056,-16.961865,1.731274,-3.499,-17.40518,1.819455,-4.106,-17.730801,1.884225,-5.387,-15.167028,1.374259],
// 4 72 21.112 -16.961865 1.731274 20.669 -17.40518 1.819455 20.062 -17.730801 1.884225 18.781 -15.167028 1.374259
  [4,72,21.112,-16.961865,1.731274,20.669,-17.40518,1.819455,20.062,-17.730801,1.884225,18.781,-15.167028,1.374259],
// 4 72 -22.878 -18.012286 1.940216 -23.875 -17.56799 1.85184 -24.636 -16.720592 1.683282 -22.077 -15.339646 1.408594
  [4,72,-22.878,-18.012286,1.940216,-23.875,-17.56799,1.85184,-24.636,-16.720592,1.683282,-22.077,-15.339646,1.408594],
// 4 15 3.261 -17.661165 1.870373 -3.499 -17.40518 1.819455 -3.056 -16.961865 1.731274 2.178 -16.803958 1.699864
  [4,15,3.261,-17.661165,1.870373,-3.499,-17.40518,1.819455,-3.056,-16.961865,1.731274,2.178,-16.803958,1.699864],
// 4 72 -5.608 -17.996593 1.937094 -6.391 -17.9299 1.923828 -7.115 -17.730801 1.884225 -5.598 -15.315126 1.403717
  [4,72,-5.608,-17.996593,1.937094,-6.391,-17.9299,1.923828,-7.115,-17.730801,1.884225,-5.598,-15.315126,1.403717],
// 4 72 18.56 -17.996593 1.937094 17.777 -17.9299 1.923828 17.053 -17.730801 1.884225 18.57 -15.315126 1.403717
  [4,72,18.56,-17.996593,1.937094,17.777,-17.9299,1.923828,17.053,-17.730801,1.884225,18.57,-15.315126,1.403717],
// 4 15 3.261 -17.661165 1.870373 4.66 -17.946573 1.927145 -4.106 -17.730801 1.884225 -3.499 -17.40518 1.819455
  [4,15,3.261,-17.661165,1.870373,4.66,-17.946573,1.927145,-4.106,-17.730801,1.884225,-3.499,-17.40518,1.819455],
// 3 15 -24.636 -16.720592 1.683282 -27.5 -20.705524 2.475934 -24.89 -15.558361 1.4521
  [3,15,-24.636,-16.720592,1.683282,-27.5,-20.705524,2.475934,-24.89,-15.558361,1.4521],
// 3 15 27.5 -20.705524 2.475934 21.112 -16.961865 1.731274 21.494 -16.114466 1.562716
  [3,15,27.5,-20.705524,2.475934,21.112,-16.961865,1.731274,21.494,-16.114466,1.562716],
// 3 15 -23.875 -17.56799 1.85184 -27.5 -20.705524 2.475934 -24.636 -16.720592 1.683282
  [3,15,-23.875,-17.56799,1.85184,-27.5,-20.705524,2.475934,-24.636,-16.720592,1.683282],
// 3 15 27.5 -20.705524 2.475934 20.669 -17.40518 1.819455 21.112 -16.961865 1.731274
  [3,15,27.5,-20.705524,2.475934,20.669,-17.40518,1.819455,21.112,-16.961865,1.731274],
// 3 15 18.56 -17.996593 1.937094 27.5 -20.705524 2.475934 11.642 -17.946573 1.927145
  [3,15,18.56,-17.996593,1.937094,27.5,-20.705524,2.475934,11.642,-17.946573,1.927145],
// 3 15 27.5 -20.705524 2.475934 -5.608 -17.996593 1.937094 4.66 -17.946573 1.927145
  [3,15,27.5,-20.705524,2.475934,-5.608,-17.996593,1.937094,4.66,-17.946573,1.927145],
// 3 15 -27.5 -20.705524 2.475934 -21.634 -18.159404 1.969479 -15.254 -18.033863 1.944508
  [3,15,-27.5,-20.705524,2.475934,-21.634,-18.159404,1.969479,-15.254,-18.033863,1.944508],
// 3 15 27.5 -20.705524 2.475934 20.062 -17.730801 1.884225 20.669 -17.40518 1.819455
  [3,15,27.5,-20.705524,2.475934,20.062,-17.730801,1.884225,20.669,-17.40518,1.819455],
// 3 15 -22.878 -18.012286 1.940216 -27.5 -20.705524 2.475934 -23.875 -17.56799 1.85184
  [3,15,-22.878,-18.012286,1.940216,-27.5,-20.705524,2.475934,-23.875,-17.56799,1.85184],
// 3 15 27.5 -20.705524 2.475934 19.343 -17.9299 1.923828 20.062 -17.730801 1.884225
  [3,15,27.5,-20.705524,2.475934,19.343,-17.9299,1.923828,20.062,-17.730801,1.884225],
// 3 15 27.5 -20.705524 2.475934 18.56 -17.996593 1.937094 19.343 -17.9299 1.923828
  [3,15,27.5,-20.705524,2.475934,18.56,-17.996593,1.937094,19.343,-17.9299,1.923828],
// 4 15 27.5 -20.705524 2.475934 -27.5 -20.705524 2.475934 -12.52 -18.033863 1.944508 -5.608 -17.996593 1.937094
  [4,15,27.5,-20.705524,2.475934,-27.5,-20.705524,2.475934,-12.52,-18.033863,1.944508,-5.608,-17.996593,1.937094],
// 3 15 -21.634 -18.159404 1.969479 -27.5 -20.705524 2.475934 -22.878 -18.012286 1.940216
  [3,15,-21.634,-18.159404,1.969479,-27.5,-20.705524,2.475934,-22.878,-18.012286,1.940216],
// 4 15 27.5 -21.719684 2.820195 -27.5 -21.719684 2.820195 -27.5 -20.705524 2.475934 27.5 -20.705524 2.475934
  [4,15,27.5,-21.719684,2.820195,-27.5,-21.719684,2.820195,-27.5,-20.705524,2.475934,27.5,-20.705524,2.475934],
// 4 16 27.5 -20.705524 2.725934 -27.5 -20.705524 2.725934 -27.5 -21.719684 3.070195 27.5 -21.719684 3.070195
  [4,16,27.5,-20.705524,2.725934,-27.5,-20.705524,2.725934,-27.5,-21.719684,3.070195,27.5,-21.719684,3.070195],
// 4 16 -27.5 -20.705524 2.725934 -27.5 -20.705524 2.475934 -27.5 -21.719684 2.820195 -27.5 -21.719684 3.070195
  [4,16,-27.5,-20.705524,2.725934,-27.5,-20.705524,2.475934,-27.5,-21.719684,2.820195,-27.5,-21.719684,3.070195],
// 4 16 27.5 -20.705524 2.475934 27.5 -20.705524 2.725934 27.5 -21.719684 3.070195 27.5 -21.719684 2.820195
  [4,16,27.5,-20.705524,2.475934,27.5,-20.705524,2.725934,27.5,-21.719684,3.070195,27.5,-21.719684,2.820195],
// 4 16 27.5 -21.719684 2.820195 27.5 -21.719684 3.070195 -27.5 -21.719684 3.070195 -27.5 -21.719684 2.820195
  [4,16,27.5,-21.719684,2.820195,27.5,-21.719684,3.070195,-27.5,-21.719684,3.070195,-27.5,-21.719684,2.820195],
// 5 24 -27.5 -10.442095 .434411 27.5 -10.442095 .434411 27.5 -20.705524 2.475934 27.5 -1.995718 -.119194
  [5,24,-27.5,-10.442095,.434411,27.5,-10.442095,.434411,27.5,-20.705524,2.475934,27.5,-1.995718,-.119194],
// 5 24 -27.5 -20.705524 2.475934 27.5 -20.705524 2.475934 27.5 -21.719684 2.820195 27.5 -10.442095 .434411
  [5,24,-27.5,-20.705524,2.475934,27.5,-20.705524,2.475934,27.5,-21.719684,2.820195,27.5,-10.442095,.434411],
// 5 24 -27.5 -10.442095 0.684411 27.5 -10.442095 0.684411 27.5 -1.995718 0.130806 27.5 -20.705524 2.725934
  [5,24,-27.5,-10.442095,0.684411,27.5,-10.442095,0.684411,27.5,-1.995718,0.130806,27.5,-20.705524,2.725934],
// 5 24 -27.5 -20.705524 2.725934 27.5 -20.705524 2.725934 27.5 -10.442095 0.684411 27.5 -21.719684 3.070195
  [5,24,-27.5,-20.705524,2.725934,27.5,-20.705524,2.725934,27.5,-10.442095,0.684411,27.5,-21.719684,3.070195],
// 3 72 8.974959 -10.442095 .434411 9.189 -10.34181 .427838 12.108166 -10.442095 .434411
  [3,72,8.974959,-10.442095,.434411,9.189,-10.34181,.427838,12.108166,-10.442095,.434411],
// 3 72 12.108166 -10.442095 .434411 9.189 -10.34181 .427838 9.42 -9.575454 .377608
  [3,72,12.108166,-10.442095,.434411,9.189,-10.34181,.427838,9.42,-9.575454,.377608],
// 3 15 -16.828495 -10.442095 .434411 -15.254 -10.442095 .434411 -16.916 -10.745648 .494791
  [3,15,-16.828495,-10.442095,.434411,-15.254,-10.442095,.434411,-16.916,-10.745648,.494791],
// 3 15 -16.916 -10.745648 .494791 -15.254 -10.442095 .434411 -17.354 -12.465945 .83698
  [3,15,-16.916,-10.745648,.494791,-15.254,-10.442095,.434411,-17.354,-12.465945,.83698],
// 3 15 -17.354 -12.465945 .83698 -15.254 -10.442095 .434411 -17.798 -14.094049 1.16083
  [3,15,-17.354,-12.465945,.83698,-15.254,-10.442095,.434411,-17.798,-14.094049,1.16083],
];
module ldraw_lib__6342851ec01(step=0, col=false, unit=2/5, alt=false, line=0.2, solid=!$preview)
    makepoly(ldraw_lib__6342851ec01(), step=step, col=col, unit=unit, alt=alt, line=line, solid=solid);
ldraw_lib__6342851ec01(line=0.2);
